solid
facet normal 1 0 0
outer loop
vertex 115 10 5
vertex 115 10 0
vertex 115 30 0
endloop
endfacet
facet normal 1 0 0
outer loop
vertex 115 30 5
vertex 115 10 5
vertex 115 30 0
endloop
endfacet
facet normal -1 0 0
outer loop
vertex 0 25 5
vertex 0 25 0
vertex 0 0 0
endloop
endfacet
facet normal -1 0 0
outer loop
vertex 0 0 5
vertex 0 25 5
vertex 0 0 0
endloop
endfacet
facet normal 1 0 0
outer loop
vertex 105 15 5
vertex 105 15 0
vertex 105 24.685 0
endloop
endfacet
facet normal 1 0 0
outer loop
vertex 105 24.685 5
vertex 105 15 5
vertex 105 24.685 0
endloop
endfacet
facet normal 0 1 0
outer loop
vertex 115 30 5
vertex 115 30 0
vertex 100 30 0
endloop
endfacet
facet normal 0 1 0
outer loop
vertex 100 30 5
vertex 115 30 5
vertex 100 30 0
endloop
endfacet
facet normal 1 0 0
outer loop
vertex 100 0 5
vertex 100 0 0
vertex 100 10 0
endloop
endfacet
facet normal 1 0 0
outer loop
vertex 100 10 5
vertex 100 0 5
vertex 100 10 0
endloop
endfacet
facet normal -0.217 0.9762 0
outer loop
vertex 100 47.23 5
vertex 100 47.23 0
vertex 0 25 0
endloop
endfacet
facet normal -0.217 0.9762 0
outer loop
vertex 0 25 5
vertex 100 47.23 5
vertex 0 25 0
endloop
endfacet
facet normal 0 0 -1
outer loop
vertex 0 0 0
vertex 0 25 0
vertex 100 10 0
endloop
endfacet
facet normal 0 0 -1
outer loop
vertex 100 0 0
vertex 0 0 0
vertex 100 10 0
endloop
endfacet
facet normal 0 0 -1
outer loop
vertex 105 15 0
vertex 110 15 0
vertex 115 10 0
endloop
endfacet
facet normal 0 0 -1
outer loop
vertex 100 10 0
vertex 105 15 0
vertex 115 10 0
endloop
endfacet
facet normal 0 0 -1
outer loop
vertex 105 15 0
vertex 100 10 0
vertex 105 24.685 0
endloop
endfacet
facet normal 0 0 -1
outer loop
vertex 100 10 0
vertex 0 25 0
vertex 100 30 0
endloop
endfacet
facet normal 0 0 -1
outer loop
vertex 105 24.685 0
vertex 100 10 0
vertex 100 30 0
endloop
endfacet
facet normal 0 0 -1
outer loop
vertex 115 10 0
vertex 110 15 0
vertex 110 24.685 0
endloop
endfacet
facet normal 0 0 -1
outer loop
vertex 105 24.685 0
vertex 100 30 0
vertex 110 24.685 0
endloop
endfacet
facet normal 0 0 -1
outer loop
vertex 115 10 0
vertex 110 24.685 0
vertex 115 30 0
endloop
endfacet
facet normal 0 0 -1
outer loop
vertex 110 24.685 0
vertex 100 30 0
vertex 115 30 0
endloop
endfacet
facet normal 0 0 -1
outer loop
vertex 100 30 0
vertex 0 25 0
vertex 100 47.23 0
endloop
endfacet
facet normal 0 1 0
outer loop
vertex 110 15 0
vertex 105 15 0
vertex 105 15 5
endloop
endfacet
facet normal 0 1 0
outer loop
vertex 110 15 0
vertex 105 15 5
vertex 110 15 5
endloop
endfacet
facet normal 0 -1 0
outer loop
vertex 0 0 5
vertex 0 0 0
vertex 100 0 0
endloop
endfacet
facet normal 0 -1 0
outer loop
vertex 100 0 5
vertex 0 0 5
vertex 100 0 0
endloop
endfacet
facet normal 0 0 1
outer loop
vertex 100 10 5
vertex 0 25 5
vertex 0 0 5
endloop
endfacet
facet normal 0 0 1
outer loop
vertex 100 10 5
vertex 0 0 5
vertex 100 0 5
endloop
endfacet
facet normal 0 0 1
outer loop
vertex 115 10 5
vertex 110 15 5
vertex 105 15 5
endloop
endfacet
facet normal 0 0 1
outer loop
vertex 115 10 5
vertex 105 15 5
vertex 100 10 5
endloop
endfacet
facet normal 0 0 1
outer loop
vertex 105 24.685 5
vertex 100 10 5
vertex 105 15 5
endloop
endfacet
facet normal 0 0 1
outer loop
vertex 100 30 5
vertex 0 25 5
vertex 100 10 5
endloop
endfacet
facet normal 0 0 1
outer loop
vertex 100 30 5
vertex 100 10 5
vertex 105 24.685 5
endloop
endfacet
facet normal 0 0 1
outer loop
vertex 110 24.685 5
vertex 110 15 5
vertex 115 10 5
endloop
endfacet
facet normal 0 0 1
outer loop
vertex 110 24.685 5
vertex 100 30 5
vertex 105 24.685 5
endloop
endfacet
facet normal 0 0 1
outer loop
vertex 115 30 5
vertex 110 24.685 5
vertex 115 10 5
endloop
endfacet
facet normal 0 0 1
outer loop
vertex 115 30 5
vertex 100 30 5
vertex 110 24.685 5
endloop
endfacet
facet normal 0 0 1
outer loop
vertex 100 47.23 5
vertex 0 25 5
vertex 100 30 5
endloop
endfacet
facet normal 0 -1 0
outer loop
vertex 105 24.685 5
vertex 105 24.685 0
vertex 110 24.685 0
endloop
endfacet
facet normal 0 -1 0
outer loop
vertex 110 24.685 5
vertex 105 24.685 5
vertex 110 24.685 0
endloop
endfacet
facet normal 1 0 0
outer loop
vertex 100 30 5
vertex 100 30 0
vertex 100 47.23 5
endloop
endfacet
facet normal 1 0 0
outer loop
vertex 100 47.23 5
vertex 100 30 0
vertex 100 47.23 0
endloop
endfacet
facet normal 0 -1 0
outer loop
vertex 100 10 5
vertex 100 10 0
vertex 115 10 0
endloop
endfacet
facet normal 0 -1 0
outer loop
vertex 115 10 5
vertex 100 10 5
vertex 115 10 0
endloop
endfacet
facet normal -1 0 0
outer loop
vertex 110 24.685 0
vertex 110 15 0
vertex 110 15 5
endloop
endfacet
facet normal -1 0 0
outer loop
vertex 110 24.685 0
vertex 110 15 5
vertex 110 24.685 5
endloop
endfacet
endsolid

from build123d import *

# Parameters (mm, degrees)
SKETCH1_W           = 5
SKETCH1_H           = 9.685479934
BOSS_EXTRUDE1_DEPTH = 5


with BuildPart() as part:
    # Sketch1 → Boss-Extrude1 (new body)
    with BuildSketch(Plane.XY):
        Polygon((100, 30), (100, 47.229662795), (0, 25), (0, 0), (100, 0), (100, 10), (115, 10), (115, 30), align=None)
        with Locations((107.5, 19.842739967)):
            Rectangle(SKETCH1_W, SKETCH1_H, mode=Mode.SUBTRACT)
    extrude(amount=BOSS_EXTRUDE1_DEPTH)


solid = part.part
